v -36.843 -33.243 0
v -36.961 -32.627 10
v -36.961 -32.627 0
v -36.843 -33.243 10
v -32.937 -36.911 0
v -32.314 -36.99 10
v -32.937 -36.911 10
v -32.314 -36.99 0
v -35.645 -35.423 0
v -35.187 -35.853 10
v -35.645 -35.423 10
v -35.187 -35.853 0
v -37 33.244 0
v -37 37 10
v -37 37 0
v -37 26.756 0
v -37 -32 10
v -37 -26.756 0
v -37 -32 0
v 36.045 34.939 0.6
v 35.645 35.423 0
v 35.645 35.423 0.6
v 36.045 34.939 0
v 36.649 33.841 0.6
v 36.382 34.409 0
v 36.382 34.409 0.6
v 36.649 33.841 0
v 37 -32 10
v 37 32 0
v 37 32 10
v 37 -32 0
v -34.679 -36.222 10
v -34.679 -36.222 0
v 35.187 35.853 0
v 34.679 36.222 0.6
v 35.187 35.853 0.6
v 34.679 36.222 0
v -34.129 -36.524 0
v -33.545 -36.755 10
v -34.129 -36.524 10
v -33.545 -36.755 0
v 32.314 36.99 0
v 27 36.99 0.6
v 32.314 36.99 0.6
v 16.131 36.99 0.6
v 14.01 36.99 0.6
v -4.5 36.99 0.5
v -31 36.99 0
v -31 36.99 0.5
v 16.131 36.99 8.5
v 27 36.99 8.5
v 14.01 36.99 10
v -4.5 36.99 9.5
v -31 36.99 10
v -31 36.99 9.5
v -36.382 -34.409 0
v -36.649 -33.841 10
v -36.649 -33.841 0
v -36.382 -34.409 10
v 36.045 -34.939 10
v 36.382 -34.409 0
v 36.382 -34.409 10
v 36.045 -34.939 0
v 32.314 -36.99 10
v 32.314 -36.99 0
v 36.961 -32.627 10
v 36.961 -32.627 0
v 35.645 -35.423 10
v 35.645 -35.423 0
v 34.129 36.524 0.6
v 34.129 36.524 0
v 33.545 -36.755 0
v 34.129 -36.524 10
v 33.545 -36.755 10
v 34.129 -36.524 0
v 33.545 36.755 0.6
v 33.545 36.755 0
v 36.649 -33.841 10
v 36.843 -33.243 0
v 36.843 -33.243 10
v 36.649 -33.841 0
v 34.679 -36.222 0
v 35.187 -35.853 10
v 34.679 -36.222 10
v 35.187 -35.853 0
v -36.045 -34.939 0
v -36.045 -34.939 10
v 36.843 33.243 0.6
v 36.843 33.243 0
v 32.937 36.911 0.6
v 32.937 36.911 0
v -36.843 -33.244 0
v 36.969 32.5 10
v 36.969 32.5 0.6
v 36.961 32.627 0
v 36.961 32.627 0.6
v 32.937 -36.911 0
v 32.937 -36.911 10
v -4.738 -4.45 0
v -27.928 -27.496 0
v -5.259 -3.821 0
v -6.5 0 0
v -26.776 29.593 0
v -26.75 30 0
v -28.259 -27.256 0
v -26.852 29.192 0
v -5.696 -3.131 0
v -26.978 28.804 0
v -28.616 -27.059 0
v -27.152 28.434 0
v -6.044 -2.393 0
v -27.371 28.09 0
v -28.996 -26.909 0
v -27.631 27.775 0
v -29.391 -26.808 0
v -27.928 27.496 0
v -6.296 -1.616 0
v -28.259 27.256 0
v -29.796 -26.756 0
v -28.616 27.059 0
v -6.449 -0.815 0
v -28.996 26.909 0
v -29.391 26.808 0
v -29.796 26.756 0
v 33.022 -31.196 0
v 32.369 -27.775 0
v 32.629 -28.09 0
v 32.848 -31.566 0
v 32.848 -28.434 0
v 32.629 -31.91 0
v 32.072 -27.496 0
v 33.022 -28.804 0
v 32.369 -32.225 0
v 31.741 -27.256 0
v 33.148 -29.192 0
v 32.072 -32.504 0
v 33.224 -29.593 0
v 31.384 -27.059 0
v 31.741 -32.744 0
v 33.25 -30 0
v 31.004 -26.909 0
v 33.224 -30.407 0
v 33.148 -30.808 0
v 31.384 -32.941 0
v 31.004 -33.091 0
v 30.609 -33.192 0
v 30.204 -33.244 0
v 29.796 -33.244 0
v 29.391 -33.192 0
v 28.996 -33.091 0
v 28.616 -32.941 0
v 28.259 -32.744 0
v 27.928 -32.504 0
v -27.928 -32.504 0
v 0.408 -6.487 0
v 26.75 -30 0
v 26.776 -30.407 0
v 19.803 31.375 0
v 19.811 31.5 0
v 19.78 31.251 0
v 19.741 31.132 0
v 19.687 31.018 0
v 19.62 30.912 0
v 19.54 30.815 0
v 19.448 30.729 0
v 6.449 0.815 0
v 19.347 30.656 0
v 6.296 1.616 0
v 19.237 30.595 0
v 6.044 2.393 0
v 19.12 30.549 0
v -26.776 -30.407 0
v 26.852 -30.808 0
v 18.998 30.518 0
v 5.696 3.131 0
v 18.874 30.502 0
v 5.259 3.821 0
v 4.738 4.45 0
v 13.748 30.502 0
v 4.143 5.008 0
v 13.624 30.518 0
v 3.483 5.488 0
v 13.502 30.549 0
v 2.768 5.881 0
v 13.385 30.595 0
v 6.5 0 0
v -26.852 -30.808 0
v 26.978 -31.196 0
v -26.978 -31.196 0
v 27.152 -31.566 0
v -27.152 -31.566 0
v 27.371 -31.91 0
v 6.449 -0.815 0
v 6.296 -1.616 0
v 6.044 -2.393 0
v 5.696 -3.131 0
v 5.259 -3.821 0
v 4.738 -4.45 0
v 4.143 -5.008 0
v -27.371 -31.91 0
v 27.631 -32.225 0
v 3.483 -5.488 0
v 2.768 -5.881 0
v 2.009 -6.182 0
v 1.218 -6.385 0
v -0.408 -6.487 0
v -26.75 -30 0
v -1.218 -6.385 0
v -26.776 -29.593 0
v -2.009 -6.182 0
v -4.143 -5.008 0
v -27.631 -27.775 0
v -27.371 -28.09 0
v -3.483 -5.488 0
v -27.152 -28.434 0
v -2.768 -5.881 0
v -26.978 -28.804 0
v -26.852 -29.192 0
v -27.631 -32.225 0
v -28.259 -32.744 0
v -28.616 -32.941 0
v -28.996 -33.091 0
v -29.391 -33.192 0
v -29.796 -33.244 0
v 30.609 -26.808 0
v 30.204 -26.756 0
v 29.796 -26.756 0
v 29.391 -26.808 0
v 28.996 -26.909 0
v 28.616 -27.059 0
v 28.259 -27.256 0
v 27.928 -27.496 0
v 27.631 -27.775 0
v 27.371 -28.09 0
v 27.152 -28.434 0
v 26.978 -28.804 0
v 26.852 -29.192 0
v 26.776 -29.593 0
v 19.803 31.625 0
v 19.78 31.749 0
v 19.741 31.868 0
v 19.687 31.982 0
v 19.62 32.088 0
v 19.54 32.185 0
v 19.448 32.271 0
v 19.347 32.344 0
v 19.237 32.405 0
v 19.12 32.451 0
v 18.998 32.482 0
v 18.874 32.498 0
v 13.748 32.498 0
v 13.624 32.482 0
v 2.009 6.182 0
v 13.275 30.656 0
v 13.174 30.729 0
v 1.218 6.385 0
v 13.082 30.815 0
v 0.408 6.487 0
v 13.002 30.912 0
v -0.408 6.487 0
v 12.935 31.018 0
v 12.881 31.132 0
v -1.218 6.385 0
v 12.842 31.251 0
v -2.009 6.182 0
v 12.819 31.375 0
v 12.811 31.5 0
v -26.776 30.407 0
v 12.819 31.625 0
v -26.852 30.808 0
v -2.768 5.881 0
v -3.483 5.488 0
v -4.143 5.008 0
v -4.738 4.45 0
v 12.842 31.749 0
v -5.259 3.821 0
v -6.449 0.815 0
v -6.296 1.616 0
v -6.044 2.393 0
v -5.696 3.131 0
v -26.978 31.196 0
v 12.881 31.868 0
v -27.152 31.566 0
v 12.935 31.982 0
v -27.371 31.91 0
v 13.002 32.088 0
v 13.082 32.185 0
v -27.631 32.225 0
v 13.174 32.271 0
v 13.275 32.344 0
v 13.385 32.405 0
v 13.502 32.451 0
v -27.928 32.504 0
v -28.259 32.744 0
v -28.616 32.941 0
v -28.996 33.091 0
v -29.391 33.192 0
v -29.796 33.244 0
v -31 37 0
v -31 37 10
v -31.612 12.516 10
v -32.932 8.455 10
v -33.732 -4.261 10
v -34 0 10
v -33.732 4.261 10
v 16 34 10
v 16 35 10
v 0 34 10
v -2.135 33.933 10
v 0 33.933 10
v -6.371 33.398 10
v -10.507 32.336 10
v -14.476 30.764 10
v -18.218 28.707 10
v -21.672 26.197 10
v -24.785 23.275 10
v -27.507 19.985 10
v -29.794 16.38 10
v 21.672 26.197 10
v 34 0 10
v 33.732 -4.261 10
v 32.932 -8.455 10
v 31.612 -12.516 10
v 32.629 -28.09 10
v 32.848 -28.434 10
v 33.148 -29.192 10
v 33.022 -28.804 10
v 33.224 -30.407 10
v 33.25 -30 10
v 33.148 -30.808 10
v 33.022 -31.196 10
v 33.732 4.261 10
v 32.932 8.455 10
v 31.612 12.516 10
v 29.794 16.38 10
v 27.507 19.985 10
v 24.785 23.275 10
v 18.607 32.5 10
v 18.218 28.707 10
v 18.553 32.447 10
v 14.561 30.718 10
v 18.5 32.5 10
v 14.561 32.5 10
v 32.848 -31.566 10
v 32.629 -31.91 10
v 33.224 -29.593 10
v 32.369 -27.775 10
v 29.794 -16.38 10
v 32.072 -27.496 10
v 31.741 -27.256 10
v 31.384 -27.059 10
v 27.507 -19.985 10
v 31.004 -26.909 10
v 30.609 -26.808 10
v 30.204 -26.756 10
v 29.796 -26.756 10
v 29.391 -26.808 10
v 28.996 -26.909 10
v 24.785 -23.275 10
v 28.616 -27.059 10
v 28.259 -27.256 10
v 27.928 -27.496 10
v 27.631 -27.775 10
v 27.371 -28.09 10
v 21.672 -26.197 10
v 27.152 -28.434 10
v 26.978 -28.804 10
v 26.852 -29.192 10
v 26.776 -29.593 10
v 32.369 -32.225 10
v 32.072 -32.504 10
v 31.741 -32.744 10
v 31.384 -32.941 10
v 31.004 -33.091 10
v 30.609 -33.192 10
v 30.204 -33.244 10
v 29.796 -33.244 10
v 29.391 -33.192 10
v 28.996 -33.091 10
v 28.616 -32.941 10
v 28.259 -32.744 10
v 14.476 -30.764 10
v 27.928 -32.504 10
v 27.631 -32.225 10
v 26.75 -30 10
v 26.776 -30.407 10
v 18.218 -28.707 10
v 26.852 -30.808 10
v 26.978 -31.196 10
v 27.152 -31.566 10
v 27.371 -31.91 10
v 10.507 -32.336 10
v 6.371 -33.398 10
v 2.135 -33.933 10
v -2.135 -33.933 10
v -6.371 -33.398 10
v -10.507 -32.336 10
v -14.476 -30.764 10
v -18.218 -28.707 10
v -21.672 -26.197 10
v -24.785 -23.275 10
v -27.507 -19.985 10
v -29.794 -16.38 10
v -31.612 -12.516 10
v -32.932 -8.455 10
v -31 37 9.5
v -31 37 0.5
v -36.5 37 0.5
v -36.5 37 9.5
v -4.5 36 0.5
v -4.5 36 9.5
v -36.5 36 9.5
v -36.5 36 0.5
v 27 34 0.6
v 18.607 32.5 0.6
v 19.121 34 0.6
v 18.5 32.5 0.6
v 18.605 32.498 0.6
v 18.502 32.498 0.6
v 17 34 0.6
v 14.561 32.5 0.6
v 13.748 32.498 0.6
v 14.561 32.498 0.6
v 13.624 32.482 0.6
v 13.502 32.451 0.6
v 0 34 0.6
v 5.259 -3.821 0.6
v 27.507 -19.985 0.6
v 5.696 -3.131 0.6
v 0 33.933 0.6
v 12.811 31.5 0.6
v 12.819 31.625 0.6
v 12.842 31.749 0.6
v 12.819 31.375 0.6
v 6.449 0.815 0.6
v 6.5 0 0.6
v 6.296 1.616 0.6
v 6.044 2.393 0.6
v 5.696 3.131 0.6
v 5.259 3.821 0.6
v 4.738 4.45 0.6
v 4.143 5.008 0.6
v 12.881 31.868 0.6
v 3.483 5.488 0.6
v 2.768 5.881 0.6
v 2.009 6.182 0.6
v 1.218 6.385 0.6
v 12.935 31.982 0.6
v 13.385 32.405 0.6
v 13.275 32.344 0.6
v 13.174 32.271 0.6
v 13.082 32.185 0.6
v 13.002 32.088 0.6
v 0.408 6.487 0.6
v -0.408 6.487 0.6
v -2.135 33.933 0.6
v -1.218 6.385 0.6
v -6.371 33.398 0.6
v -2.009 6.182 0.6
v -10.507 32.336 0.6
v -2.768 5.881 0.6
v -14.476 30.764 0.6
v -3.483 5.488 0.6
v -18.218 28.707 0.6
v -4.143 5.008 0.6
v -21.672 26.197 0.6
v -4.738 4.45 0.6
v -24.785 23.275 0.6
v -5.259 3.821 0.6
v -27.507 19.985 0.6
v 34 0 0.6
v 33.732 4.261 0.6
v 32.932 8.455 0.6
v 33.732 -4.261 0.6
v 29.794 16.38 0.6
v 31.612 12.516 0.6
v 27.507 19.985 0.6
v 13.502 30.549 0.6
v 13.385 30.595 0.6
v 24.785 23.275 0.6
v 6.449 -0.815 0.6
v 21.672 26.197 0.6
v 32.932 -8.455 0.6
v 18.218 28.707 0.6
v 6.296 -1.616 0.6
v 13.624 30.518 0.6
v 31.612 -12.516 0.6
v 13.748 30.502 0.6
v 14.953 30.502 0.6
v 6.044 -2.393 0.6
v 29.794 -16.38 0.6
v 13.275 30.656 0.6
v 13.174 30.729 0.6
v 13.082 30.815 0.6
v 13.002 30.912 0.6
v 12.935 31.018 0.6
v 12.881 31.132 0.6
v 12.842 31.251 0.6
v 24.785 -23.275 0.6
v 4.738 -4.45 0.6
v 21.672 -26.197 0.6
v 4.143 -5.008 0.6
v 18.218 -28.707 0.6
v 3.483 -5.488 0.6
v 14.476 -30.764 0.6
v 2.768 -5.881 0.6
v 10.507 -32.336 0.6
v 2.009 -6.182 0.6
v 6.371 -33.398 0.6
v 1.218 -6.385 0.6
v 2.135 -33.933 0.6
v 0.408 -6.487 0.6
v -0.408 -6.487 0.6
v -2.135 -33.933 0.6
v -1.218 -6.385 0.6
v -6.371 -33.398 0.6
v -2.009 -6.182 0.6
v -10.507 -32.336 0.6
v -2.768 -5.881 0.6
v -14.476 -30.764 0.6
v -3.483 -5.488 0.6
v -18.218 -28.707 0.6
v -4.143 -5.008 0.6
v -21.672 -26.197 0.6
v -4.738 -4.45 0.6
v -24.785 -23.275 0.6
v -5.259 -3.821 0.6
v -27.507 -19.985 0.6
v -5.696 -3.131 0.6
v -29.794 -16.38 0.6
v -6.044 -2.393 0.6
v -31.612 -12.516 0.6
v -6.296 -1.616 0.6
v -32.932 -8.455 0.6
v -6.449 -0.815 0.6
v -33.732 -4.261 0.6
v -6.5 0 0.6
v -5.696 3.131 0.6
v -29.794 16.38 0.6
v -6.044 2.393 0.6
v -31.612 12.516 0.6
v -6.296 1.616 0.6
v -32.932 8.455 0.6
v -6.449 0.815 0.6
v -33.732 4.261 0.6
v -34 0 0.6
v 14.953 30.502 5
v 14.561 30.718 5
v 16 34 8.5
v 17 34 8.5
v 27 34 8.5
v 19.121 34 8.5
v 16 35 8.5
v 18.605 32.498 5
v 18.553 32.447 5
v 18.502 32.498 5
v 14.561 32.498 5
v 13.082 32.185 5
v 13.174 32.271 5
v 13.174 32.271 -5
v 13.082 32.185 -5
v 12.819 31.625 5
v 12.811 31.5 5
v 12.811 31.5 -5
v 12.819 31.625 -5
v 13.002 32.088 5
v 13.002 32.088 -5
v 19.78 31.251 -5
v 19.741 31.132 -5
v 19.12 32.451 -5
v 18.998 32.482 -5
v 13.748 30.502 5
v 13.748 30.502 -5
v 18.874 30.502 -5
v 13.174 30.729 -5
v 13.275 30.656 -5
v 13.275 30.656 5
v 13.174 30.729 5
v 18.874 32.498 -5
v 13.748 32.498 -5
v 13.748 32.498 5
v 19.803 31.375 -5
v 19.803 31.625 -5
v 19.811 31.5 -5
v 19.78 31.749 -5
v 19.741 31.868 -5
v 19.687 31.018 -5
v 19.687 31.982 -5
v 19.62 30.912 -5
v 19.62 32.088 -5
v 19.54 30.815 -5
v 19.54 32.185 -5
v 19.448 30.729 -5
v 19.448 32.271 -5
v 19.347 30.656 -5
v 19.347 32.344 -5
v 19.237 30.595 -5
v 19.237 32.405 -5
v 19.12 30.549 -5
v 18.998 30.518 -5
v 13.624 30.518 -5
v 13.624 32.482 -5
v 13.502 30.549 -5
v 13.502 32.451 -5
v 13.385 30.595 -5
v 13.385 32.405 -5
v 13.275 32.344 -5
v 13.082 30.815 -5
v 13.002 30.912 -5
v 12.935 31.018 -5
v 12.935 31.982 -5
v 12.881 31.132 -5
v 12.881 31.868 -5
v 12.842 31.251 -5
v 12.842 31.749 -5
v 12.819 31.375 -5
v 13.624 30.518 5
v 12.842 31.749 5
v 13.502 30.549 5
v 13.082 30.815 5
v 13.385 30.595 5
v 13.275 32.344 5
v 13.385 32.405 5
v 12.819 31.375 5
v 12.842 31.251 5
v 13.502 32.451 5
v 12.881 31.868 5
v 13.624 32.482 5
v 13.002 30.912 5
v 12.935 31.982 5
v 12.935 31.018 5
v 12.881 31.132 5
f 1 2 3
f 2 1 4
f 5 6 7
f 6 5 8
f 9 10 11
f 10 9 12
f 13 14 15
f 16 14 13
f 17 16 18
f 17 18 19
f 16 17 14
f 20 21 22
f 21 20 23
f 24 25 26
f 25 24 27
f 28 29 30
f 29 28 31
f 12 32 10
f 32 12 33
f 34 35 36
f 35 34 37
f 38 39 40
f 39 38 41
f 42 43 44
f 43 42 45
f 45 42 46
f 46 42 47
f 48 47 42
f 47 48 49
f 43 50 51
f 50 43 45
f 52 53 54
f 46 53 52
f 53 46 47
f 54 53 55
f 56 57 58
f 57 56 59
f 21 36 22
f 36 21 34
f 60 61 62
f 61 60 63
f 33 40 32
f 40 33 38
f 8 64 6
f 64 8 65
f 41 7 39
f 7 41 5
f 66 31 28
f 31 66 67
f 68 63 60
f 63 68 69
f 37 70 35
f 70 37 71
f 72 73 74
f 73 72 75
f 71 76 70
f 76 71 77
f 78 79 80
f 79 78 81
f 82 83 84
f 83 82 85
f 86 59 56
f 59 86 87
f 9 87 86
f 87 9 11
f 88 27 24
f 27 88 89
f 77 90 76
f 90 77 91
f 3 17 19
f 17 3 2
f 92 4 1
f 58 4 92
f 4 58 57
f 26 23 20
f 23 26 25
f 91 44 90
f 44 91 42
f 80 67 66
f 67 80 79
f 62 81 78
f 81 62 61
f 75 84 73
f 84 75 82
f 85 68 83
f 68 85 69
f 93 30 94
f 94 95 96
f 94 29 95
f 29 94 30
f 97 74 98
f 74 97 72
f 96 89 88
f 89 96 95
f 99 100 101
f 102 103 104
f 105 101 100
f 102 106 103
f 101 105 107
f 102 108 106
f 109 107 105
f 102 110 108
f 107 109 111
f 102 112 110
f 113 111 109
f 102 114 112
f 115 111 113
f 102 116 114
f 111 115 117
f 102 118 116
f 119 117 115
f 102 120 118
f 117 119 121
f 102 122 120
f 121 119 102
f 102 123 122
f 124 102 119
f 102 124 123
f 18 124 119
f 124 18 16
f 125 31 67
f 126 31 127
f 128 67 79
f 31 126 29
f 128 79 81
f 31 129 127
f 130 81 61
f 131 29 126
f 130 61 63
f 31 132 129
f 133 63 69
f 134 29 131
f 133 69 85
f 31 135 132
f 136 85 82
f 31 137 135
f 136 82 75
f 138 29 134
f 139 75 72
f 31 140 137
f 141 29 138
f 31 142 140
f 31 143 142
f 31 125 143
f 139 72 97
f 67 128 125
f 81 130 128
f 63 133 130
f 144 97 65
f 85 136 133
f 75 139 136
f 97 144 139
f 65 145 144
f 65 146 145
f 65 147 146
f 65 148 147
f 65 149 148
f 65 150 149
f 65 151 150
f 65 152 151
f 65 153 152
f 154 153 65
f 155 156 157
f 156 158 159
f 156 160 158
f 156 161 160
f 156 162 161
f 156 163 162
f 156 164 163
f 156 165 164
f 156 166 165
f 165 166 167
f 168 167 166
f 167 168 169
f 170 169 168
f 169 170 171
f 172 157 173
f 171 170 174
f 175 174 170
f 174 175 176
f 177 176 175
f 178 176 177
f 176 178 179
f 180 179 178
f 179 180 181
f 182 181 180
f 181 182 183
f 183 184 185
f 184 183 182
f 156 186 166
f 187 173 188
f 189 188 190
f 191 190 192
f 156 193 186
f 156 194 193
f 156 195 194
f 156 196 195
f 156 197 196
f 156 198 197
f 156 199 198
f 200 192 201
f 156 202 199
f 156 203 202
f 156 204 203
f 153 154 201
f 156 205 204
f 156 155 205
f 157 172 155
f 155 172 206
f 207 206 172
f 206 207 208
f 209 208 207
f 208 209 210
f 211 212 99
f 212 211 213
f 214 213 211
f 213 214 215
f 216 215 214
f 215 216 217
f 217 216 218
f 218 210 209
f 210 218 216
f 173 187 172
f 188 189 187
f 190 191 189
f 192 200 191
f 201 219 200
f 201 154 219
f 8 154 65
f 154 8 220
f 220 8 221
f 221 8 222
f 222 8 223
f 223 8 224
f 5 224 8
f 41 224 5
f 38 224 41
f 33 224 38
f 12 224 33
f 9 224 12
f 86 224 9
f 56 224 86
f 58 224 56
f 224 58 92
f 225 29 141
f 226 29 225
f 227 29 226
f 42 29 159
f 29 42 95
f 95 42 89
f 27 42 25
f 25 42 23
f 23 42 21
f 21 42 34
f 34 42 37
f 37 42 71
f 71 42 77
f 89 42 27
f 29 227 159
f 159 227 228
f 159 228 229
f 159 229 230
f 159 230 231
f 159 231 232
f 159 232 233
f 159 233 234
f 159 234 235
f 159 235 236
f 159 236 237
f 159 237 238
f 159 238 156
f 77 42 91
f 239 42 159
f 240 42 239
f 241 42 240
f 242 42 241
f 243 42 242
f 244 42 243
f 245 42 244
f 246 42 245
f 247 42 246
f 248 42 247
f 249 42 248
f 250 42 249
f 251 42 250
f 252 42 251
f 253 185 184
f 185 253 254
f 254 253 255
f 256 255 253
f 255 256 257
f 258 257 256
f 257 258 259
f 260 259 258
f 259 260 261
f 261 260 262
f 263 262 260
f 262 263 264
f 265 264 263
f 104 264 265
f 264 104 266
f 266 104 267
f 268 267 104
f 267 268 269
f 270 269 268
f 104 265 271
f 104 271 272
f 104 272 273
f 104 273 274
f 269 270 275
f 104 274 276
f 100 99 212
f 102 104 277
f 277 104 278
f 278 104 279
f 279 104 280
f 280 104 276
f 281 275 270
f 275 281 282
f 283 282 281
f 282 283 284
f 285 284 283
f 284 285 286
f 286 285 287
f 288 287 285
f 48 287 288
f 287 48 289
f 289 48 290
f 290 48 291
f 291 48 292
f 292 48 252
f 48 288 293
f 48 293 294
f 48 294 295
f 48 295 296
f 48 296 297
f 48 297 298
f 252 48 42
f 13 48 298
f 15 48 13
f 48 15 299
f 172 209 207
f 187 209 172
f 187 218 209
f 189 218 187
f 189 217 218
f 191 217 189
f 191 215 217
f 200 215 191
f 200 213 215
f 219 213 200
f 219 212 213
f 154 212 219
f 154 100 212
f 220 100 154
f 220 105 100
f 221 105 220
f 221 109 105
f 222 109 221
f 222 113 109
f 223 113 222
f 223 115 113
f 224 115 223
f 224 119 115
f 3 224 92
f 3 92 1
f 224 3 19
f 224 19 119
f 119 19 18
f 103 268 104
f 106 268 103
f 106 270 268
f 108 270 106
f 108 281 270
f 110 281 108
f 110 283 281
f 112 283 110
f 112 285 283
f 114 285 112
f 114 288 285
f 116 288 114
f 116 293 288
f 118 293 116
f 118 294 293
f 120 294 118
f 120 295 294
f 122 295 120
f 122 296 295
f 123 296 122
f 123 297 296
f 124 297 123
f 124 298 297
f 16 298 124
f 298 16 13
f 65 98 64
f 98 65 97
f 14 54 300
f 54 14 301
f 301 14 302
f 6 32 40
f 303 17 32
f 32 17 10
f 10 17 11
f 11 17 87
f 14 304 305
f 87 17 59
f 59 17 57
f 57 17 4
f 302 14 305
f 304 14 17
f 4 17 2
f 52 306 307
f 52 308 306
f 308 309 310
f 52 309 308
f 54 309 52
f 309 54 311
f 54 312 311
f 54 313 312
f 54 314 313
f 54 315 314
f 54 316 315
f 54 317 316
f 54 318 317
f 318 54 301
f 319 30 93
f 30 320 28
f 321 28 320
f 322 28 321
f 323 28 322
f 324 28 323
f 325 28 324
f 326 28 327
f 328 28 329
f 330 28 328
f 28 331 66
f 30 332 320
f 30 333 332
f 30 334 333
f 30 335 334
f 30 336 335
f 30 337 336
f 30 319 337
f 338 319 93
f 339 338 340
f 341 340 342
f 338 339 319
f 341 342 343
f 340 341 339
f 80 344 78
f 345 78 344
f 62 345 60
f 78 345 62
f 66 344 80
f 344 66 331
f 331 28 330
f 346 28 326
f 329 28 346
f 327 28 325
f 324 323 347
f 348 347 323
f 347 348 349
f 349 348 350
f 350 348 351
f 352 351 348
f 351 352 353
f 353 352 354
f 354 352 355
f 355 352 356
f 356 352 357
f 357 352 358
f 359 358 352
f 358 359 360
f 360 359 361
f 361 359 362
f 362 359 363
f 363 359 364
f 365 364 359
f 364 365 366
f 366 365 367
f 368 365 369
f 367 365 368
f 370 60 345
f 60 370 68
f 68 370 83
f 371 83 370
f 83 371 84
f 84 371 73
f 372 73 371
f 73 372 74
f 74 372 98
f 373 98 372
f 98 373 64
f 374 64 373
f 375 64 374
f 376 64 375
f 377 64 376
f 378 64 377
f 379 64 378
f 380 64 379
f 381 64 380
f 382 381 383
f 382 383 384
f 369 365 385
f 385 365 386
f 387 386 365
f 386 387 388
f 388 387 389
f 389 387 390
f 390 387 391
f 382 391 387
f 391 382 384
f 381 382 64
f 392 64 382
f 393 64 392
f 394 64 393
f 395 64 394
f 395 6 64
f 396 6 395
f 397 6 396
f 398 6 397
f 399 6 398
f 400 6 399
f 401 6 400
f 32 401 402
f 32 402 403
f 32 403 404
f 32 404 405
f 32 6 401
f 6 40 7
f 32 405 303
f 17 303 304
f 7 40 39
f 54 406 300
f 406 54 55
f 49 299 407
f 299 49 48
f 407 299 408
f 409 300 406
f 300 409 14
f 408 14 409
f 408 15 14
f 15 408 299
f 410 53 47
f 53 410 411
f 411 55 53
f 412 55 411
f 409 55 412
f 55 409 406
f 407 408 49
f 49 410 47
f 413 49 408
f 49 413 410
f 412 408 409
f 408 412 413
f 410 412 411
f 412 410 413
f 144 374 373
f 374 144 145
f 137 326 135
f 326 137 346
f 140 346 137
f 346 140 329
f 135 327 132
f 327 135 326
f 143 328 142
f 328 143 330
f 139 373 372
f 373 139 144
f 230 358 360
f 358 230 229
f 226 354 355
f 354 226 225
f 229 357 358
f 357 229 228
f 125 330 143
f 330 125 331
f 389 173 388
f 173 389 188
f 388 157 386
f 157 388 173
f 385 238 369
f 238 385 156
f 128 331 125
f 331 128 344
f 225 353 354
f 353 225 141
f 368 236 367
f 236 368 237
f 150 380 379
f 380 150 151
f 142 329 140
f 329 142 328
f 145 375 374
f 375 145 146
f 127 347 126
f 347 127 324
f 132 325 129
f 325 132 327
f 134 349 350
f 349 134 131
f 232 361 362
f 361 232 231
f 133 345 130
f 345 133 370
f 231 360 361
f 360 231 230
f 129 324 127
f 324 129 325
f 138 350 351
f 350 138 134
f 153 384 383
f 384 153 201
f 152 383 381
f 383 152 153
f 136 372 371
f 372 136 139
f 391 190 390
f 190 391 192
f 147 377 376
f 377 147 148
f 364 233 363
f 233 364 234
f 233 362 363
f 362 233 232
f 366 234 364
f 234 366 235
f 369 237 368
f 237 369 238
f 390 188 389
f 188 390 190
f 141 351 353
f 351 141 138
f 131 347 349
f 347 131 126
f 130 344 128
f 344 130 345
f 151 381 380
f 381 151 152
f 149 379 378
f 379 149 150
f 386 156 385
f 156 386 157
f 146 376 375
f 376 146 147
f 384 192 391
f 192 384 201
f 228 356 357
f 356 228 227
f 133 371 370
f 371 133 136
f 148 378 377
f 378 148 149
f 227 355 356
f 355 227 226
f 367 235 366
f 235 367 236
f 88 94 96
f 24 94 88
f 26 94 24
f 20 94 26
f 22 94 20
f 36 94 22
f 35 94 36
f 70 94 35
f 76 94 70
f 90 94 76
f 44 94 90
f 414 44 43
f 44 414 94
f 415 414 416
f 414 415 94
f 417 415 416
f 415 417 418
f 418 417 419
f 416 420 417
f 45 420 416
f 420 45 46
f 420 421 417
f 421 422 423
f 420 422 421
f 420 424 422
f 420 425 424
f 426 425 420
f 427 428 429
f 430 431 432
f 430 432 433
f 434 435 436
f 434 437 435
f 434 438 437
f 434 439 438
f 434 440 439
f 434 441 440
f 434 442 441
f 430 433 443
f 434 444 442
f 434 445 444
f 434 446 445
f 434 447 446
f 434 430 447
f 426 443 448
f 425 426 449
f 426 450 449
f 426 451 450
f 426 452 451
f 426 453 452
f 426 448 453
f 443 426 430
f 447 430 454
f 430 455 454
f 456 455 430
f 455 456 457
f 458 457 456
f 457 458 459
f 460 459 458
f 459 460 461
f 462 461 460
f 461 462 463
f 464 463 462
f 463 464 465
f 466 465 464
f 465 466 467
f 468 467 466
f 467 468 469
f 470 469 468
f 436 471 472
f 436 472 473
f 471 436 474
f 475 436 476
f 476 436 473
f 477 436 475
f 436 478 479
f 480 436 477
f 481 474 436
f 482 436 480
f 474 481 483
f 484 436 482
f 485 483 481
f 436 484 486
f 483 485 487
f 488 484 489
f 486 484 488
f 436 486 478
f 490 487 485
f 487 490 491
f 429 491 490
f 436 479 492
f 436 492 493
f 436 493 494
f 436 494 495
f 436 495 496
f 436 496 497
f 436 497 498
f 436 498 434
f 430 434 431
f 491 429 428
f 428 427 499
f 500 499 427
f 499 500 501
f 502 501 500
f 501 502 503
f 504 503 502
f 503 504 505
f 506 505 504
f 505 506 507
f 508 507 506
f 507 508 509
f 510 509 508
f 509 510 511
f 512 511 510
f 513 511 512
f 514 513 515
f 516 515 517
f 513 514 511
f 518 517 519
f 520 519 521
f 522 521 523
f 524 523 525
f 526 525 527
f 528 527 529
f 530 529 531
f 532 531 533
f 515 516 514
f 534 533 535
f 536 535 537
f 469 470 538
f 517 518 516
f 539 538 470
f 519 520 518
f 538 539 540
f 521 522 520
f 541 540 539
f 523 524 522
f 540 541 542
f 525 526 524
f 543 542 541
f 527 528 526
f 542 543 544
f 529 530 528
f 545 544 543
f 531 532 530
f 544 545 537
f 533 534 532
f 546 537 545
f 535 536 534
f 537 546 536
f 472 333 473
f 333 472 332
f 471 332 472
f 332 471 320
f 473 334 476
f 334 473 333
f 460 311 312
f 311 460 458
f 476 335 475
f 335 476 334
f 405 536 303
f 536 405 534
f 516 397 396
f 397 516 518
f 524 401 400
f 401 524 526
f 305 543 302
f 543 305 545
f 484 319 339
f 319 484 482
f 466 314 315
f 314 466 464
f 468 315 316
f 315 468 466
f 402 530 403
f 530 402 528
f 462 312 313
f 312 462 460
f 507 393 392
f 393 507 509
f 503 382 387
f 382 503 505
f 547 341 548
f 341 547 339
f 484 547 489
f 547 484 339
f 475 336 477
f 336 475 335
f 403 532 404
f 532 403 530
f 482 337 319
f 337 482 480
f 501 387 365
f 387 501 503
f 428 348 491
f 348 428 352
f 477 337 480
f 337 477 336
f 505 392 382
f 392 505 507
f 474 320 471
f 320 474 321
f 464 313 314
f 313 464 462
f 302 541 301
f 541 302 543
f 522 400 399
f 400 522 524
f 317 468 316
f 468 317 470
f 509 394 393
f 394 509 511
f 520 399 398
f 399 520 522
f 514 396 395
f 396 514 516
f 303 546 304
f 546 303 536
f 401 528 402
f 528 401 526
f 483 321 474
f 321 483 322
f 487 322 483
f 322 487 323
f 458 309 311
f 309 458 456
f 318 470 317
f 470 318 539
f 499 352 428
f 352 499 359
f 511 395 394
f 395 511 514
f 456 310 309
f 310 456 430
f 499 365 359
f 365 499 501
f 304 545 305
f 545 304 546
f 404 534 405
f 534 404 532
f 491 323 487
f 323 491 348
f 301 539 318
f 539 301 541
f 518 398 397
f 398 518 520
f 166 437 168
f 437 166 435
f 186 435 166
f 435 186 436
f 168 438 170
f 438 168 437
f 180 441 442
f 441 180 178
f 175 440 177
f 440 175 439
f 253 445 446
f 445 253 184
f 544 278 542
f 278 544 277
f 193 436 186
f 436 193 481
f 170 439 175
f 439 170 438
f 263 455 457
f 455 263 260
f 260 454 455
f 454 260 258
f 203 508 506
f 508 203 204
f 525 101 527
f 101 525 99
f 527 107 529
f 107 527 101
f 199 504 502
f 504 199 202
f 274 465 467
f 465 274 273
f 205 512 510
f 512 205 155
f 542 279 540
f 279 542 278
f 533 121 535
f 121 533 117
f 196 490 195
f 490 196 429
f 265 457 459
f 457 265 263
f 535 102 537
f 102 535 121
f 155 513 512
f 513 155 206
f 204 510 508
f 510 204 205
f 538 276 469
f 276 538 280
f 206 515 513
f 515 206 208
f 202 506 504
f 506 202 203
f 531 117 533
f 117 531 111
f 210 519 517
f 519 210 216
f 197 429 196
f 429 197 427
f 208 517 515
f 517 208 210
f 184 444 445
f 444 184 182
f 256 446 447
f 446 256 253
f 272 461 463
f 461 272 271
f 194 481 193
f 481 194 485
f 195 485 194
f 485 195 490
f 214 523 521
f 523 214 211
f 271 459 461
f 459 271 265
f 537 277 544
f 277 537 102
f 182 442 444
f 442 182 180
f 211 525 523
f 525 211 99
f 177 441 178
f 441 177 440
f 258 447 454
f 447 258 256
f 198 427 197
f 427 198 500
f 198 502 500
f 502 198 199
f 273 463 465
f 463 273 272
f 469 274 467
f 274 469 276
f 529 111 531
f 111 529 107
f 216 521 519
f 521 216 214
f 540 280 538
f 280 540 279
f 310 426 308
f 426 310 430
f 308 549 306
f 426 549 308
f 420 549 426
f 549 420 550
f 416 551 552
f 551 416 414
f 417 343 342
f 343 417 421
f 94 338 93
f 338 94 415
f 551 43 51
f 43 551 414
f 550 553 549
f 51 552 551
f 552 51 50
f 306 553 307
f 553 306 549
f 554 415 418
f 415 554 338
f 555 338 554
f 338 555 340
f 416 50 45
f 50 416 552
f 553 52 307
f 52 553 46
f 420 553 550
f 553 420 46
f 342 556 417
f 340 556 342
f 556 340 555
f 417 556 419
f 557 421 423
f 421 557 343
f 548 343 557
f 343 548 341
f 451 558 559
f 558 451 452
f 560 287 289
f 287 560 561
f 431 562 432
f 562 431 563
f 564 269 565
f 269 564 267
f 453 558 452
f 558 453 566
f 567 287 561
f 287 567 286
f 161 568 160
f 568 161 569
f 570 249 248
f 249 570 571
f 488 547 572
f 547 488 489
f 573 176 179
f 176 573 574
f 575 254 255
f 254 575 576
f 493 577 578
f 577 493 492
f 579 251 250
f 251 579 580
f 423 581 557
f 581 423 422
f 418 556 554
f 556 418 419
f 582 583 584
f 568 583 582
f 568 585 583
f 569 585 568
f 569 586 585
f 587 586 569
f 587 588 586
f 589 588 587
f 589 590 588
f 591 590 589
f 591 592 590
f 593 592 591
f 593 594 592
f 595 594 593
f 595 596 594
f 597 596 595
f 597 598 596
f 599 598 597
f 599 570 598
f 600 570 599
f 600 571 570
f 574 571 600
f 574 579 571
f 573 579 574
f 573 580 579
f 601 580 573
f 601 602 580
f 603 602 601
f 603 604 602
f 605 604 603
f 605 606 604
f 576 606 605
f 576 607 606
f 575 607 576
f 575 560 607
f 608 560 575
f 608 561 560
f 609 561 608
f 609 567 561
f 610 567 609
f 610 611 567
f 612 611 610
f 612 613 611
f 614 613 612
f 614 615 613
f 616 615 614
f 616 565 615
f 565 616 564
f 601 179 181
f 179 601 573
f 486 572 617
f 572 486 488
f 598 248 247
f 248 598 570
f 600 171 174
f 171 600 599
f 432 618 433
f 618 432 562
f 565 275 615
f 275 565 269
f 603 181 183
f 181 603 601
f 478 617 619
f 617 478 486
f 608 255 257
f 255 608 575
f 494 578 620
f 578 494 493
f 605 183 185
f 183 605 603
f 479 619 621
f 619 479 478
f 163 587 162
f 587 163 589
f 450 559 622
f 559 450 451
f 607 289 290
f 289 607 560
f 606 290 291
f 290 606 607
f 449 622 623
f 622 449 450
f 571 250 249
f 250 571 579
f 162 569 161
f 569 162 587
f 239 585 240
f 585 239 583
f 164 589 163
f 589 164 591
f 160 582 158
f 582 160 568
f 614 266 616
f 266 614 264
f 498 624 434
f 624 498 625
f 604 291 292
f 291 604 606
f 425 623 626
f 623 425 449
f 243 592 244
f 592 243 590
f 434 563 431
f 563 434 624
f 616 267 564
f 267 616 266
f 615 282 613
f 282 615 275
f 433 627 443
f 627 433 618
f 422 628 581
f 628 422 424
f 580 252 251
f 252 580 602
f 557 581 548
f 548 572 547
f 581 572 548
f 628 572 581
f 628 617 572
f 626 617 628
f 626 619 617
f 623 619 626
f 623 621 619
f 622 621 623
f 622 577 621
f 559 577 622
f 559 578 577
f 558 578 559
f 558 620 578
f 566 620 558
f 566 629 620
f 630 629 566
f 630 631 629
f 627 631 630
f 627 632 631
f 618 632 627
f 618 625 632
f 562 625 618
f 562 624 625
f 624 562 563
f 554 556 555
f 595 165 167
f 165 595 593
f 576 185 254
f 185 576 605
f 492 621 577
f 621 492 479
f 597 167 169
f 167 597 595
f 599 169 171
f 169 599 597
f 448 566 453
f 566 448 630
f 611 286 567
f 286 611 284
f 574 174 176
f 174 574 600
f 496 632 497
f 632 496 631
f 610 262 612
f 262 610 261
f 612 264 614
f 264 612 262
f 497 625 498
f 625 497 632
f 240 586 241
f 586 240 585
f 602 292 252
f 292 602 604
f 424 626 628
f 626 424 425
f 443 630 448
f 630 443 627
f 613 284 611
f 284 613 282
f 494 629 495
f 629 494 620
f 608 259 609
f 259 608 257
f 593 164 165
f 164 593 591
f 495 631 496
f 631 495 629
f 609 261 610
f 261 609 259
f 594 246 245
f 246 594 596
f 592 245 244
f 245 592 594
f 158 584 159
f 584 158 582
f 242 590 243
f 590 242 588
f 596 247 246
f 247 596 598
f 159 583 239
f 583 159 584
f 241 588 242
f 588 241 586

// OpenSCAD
$fn = 50;


union() {
	difference() {
		union() {
			hull() {
				translate(v = [-32.0000000000, 32.0000000000, 0]) {
					cylinder(h = 10, r = 5);
				}
				translate(v = [32.0000000000, 32.0000000000, 0]) {
					cylinder(h = 10, r = 5);
				}
				translate(v = [-32.0000000000, -32.0000000000, 0]) {
					cylinder(h = 10, r = 5);
				}
				translate(v = [32.0000000000, -32.0000000000, 0]) {
					cylinder(h = 10, r = 5);
				}
			}
			translate(v = [-37.0000000000, 31.0000000000, 0]) {
				cube(size = [6, 6, 10]);
			}
		}
		union() {
			translate(v = [-37.5000000000, -30.0000000000, -250.0000000000]) {
				rotate(a = [0, 0, 0]) {
					difference() {
						union() {
							hull() {
								translate(v = [7.5000000000, 0, 0]) {
									cylinder(h = 250, r = 3.2500000000, r1 = 3.2500000000, r2 = 3.2500000000);
								}
								translate(v = [-7.5000000000, 0, 0]) {
									cylinder(h = 250, r = 3.2500000000, r1 = 3.2500000000, r2 = 3.2500000000);
								}
							}
						}
						union();
					}
				}
			}
			translate(v = [-37.5000000000, 30.0000000000, -250.0000000000]) {
				rotate(a = [0, 0, 0]) {
					difference() {
						union() {
							hull() {
								translate(v = [7.5000000000, 0, 0]) {
									cylinder(h = 250, r = 3.2500000000, r1 = 3.2500000000, r2 = 3.2500000000);
								}
								translate(v = [-7.5000000000, 0, 0]) {
									cylinder(h = 250, r = 3.2500000000, r1 = 3.2500000000, r2 = 3.2500000000);
								}
							}
						}
						union();
					}
				}
			}
			translate(v = [-36.5000000000, 36.0000000000, 0.5000000000]) {
				cube(size = [32, 1, 9.0000000000]);
			}
			translate(v = [30.0000000000, -30.0000000000, 0]) {
				cylinder(h = 100, r = 3.2500000000);
			}
			translate(v = [0, 0, 0.6000000000]) {
				cylinder(h = 12.4000000000, r = 34.0000000000);
			}
			translate(v = [0, 0, -5.0000000000]) {
				cylinder(h = 10, r = 6.5000000000);
			}
			translate(v = [0.0000000000, 32.5000000000, 0.6000000000]) {
				cube(size = [37.0000000000, 1.5000000000, 12.4000000000]);
			}
			translate(v = [27.0000000000, 32.5000000000, 0.6000000000]) {
				cube(size = [10, 4.5000000000, 12.4000000000]);
			}
			translate(v = [16.0000000000, 32.5000000000, 8.5000000000]) {
				cube(size = [21, 4.5000000000, 1.5000000000]);
			}
			translate(v = [13.2500000000, 37.7500000000, 0.6000000000]) {
				rotate(a = [0, 0, -45]) {
					cube(size = [7.5000000000, 1.5000000000, 12.4000000000]);
				}
			}
			translate(v = [7.0610000000, 30.5000000000, 0.6000000000]) {
				cube(size = [7.5000000000, 2, 9.4000000000]);
			}
		}
	}
	union() {
		translate(v = [16.3110000000, 31.5000000000, -5.0000000000]) {
			rotate(a = [0, 0, 0]) {
				difference() {
					union() {
						#hull() {
							#translate(v = [2.5000000000, 0, 0]) {
								cylinder(h = 10, r = 1.0000000000, r1 = 1.0000000000, r2 = 1.0000000000);
							}
							#translate(v = [-2.5000000000, 0, 0]) {
								cylinder(h = 10, r = 1.0000000000, r1 = 1.0000000000, r2 = 1.0000000000);
							}
						}
					}
					union();
				}
			}
		}
	}
}
